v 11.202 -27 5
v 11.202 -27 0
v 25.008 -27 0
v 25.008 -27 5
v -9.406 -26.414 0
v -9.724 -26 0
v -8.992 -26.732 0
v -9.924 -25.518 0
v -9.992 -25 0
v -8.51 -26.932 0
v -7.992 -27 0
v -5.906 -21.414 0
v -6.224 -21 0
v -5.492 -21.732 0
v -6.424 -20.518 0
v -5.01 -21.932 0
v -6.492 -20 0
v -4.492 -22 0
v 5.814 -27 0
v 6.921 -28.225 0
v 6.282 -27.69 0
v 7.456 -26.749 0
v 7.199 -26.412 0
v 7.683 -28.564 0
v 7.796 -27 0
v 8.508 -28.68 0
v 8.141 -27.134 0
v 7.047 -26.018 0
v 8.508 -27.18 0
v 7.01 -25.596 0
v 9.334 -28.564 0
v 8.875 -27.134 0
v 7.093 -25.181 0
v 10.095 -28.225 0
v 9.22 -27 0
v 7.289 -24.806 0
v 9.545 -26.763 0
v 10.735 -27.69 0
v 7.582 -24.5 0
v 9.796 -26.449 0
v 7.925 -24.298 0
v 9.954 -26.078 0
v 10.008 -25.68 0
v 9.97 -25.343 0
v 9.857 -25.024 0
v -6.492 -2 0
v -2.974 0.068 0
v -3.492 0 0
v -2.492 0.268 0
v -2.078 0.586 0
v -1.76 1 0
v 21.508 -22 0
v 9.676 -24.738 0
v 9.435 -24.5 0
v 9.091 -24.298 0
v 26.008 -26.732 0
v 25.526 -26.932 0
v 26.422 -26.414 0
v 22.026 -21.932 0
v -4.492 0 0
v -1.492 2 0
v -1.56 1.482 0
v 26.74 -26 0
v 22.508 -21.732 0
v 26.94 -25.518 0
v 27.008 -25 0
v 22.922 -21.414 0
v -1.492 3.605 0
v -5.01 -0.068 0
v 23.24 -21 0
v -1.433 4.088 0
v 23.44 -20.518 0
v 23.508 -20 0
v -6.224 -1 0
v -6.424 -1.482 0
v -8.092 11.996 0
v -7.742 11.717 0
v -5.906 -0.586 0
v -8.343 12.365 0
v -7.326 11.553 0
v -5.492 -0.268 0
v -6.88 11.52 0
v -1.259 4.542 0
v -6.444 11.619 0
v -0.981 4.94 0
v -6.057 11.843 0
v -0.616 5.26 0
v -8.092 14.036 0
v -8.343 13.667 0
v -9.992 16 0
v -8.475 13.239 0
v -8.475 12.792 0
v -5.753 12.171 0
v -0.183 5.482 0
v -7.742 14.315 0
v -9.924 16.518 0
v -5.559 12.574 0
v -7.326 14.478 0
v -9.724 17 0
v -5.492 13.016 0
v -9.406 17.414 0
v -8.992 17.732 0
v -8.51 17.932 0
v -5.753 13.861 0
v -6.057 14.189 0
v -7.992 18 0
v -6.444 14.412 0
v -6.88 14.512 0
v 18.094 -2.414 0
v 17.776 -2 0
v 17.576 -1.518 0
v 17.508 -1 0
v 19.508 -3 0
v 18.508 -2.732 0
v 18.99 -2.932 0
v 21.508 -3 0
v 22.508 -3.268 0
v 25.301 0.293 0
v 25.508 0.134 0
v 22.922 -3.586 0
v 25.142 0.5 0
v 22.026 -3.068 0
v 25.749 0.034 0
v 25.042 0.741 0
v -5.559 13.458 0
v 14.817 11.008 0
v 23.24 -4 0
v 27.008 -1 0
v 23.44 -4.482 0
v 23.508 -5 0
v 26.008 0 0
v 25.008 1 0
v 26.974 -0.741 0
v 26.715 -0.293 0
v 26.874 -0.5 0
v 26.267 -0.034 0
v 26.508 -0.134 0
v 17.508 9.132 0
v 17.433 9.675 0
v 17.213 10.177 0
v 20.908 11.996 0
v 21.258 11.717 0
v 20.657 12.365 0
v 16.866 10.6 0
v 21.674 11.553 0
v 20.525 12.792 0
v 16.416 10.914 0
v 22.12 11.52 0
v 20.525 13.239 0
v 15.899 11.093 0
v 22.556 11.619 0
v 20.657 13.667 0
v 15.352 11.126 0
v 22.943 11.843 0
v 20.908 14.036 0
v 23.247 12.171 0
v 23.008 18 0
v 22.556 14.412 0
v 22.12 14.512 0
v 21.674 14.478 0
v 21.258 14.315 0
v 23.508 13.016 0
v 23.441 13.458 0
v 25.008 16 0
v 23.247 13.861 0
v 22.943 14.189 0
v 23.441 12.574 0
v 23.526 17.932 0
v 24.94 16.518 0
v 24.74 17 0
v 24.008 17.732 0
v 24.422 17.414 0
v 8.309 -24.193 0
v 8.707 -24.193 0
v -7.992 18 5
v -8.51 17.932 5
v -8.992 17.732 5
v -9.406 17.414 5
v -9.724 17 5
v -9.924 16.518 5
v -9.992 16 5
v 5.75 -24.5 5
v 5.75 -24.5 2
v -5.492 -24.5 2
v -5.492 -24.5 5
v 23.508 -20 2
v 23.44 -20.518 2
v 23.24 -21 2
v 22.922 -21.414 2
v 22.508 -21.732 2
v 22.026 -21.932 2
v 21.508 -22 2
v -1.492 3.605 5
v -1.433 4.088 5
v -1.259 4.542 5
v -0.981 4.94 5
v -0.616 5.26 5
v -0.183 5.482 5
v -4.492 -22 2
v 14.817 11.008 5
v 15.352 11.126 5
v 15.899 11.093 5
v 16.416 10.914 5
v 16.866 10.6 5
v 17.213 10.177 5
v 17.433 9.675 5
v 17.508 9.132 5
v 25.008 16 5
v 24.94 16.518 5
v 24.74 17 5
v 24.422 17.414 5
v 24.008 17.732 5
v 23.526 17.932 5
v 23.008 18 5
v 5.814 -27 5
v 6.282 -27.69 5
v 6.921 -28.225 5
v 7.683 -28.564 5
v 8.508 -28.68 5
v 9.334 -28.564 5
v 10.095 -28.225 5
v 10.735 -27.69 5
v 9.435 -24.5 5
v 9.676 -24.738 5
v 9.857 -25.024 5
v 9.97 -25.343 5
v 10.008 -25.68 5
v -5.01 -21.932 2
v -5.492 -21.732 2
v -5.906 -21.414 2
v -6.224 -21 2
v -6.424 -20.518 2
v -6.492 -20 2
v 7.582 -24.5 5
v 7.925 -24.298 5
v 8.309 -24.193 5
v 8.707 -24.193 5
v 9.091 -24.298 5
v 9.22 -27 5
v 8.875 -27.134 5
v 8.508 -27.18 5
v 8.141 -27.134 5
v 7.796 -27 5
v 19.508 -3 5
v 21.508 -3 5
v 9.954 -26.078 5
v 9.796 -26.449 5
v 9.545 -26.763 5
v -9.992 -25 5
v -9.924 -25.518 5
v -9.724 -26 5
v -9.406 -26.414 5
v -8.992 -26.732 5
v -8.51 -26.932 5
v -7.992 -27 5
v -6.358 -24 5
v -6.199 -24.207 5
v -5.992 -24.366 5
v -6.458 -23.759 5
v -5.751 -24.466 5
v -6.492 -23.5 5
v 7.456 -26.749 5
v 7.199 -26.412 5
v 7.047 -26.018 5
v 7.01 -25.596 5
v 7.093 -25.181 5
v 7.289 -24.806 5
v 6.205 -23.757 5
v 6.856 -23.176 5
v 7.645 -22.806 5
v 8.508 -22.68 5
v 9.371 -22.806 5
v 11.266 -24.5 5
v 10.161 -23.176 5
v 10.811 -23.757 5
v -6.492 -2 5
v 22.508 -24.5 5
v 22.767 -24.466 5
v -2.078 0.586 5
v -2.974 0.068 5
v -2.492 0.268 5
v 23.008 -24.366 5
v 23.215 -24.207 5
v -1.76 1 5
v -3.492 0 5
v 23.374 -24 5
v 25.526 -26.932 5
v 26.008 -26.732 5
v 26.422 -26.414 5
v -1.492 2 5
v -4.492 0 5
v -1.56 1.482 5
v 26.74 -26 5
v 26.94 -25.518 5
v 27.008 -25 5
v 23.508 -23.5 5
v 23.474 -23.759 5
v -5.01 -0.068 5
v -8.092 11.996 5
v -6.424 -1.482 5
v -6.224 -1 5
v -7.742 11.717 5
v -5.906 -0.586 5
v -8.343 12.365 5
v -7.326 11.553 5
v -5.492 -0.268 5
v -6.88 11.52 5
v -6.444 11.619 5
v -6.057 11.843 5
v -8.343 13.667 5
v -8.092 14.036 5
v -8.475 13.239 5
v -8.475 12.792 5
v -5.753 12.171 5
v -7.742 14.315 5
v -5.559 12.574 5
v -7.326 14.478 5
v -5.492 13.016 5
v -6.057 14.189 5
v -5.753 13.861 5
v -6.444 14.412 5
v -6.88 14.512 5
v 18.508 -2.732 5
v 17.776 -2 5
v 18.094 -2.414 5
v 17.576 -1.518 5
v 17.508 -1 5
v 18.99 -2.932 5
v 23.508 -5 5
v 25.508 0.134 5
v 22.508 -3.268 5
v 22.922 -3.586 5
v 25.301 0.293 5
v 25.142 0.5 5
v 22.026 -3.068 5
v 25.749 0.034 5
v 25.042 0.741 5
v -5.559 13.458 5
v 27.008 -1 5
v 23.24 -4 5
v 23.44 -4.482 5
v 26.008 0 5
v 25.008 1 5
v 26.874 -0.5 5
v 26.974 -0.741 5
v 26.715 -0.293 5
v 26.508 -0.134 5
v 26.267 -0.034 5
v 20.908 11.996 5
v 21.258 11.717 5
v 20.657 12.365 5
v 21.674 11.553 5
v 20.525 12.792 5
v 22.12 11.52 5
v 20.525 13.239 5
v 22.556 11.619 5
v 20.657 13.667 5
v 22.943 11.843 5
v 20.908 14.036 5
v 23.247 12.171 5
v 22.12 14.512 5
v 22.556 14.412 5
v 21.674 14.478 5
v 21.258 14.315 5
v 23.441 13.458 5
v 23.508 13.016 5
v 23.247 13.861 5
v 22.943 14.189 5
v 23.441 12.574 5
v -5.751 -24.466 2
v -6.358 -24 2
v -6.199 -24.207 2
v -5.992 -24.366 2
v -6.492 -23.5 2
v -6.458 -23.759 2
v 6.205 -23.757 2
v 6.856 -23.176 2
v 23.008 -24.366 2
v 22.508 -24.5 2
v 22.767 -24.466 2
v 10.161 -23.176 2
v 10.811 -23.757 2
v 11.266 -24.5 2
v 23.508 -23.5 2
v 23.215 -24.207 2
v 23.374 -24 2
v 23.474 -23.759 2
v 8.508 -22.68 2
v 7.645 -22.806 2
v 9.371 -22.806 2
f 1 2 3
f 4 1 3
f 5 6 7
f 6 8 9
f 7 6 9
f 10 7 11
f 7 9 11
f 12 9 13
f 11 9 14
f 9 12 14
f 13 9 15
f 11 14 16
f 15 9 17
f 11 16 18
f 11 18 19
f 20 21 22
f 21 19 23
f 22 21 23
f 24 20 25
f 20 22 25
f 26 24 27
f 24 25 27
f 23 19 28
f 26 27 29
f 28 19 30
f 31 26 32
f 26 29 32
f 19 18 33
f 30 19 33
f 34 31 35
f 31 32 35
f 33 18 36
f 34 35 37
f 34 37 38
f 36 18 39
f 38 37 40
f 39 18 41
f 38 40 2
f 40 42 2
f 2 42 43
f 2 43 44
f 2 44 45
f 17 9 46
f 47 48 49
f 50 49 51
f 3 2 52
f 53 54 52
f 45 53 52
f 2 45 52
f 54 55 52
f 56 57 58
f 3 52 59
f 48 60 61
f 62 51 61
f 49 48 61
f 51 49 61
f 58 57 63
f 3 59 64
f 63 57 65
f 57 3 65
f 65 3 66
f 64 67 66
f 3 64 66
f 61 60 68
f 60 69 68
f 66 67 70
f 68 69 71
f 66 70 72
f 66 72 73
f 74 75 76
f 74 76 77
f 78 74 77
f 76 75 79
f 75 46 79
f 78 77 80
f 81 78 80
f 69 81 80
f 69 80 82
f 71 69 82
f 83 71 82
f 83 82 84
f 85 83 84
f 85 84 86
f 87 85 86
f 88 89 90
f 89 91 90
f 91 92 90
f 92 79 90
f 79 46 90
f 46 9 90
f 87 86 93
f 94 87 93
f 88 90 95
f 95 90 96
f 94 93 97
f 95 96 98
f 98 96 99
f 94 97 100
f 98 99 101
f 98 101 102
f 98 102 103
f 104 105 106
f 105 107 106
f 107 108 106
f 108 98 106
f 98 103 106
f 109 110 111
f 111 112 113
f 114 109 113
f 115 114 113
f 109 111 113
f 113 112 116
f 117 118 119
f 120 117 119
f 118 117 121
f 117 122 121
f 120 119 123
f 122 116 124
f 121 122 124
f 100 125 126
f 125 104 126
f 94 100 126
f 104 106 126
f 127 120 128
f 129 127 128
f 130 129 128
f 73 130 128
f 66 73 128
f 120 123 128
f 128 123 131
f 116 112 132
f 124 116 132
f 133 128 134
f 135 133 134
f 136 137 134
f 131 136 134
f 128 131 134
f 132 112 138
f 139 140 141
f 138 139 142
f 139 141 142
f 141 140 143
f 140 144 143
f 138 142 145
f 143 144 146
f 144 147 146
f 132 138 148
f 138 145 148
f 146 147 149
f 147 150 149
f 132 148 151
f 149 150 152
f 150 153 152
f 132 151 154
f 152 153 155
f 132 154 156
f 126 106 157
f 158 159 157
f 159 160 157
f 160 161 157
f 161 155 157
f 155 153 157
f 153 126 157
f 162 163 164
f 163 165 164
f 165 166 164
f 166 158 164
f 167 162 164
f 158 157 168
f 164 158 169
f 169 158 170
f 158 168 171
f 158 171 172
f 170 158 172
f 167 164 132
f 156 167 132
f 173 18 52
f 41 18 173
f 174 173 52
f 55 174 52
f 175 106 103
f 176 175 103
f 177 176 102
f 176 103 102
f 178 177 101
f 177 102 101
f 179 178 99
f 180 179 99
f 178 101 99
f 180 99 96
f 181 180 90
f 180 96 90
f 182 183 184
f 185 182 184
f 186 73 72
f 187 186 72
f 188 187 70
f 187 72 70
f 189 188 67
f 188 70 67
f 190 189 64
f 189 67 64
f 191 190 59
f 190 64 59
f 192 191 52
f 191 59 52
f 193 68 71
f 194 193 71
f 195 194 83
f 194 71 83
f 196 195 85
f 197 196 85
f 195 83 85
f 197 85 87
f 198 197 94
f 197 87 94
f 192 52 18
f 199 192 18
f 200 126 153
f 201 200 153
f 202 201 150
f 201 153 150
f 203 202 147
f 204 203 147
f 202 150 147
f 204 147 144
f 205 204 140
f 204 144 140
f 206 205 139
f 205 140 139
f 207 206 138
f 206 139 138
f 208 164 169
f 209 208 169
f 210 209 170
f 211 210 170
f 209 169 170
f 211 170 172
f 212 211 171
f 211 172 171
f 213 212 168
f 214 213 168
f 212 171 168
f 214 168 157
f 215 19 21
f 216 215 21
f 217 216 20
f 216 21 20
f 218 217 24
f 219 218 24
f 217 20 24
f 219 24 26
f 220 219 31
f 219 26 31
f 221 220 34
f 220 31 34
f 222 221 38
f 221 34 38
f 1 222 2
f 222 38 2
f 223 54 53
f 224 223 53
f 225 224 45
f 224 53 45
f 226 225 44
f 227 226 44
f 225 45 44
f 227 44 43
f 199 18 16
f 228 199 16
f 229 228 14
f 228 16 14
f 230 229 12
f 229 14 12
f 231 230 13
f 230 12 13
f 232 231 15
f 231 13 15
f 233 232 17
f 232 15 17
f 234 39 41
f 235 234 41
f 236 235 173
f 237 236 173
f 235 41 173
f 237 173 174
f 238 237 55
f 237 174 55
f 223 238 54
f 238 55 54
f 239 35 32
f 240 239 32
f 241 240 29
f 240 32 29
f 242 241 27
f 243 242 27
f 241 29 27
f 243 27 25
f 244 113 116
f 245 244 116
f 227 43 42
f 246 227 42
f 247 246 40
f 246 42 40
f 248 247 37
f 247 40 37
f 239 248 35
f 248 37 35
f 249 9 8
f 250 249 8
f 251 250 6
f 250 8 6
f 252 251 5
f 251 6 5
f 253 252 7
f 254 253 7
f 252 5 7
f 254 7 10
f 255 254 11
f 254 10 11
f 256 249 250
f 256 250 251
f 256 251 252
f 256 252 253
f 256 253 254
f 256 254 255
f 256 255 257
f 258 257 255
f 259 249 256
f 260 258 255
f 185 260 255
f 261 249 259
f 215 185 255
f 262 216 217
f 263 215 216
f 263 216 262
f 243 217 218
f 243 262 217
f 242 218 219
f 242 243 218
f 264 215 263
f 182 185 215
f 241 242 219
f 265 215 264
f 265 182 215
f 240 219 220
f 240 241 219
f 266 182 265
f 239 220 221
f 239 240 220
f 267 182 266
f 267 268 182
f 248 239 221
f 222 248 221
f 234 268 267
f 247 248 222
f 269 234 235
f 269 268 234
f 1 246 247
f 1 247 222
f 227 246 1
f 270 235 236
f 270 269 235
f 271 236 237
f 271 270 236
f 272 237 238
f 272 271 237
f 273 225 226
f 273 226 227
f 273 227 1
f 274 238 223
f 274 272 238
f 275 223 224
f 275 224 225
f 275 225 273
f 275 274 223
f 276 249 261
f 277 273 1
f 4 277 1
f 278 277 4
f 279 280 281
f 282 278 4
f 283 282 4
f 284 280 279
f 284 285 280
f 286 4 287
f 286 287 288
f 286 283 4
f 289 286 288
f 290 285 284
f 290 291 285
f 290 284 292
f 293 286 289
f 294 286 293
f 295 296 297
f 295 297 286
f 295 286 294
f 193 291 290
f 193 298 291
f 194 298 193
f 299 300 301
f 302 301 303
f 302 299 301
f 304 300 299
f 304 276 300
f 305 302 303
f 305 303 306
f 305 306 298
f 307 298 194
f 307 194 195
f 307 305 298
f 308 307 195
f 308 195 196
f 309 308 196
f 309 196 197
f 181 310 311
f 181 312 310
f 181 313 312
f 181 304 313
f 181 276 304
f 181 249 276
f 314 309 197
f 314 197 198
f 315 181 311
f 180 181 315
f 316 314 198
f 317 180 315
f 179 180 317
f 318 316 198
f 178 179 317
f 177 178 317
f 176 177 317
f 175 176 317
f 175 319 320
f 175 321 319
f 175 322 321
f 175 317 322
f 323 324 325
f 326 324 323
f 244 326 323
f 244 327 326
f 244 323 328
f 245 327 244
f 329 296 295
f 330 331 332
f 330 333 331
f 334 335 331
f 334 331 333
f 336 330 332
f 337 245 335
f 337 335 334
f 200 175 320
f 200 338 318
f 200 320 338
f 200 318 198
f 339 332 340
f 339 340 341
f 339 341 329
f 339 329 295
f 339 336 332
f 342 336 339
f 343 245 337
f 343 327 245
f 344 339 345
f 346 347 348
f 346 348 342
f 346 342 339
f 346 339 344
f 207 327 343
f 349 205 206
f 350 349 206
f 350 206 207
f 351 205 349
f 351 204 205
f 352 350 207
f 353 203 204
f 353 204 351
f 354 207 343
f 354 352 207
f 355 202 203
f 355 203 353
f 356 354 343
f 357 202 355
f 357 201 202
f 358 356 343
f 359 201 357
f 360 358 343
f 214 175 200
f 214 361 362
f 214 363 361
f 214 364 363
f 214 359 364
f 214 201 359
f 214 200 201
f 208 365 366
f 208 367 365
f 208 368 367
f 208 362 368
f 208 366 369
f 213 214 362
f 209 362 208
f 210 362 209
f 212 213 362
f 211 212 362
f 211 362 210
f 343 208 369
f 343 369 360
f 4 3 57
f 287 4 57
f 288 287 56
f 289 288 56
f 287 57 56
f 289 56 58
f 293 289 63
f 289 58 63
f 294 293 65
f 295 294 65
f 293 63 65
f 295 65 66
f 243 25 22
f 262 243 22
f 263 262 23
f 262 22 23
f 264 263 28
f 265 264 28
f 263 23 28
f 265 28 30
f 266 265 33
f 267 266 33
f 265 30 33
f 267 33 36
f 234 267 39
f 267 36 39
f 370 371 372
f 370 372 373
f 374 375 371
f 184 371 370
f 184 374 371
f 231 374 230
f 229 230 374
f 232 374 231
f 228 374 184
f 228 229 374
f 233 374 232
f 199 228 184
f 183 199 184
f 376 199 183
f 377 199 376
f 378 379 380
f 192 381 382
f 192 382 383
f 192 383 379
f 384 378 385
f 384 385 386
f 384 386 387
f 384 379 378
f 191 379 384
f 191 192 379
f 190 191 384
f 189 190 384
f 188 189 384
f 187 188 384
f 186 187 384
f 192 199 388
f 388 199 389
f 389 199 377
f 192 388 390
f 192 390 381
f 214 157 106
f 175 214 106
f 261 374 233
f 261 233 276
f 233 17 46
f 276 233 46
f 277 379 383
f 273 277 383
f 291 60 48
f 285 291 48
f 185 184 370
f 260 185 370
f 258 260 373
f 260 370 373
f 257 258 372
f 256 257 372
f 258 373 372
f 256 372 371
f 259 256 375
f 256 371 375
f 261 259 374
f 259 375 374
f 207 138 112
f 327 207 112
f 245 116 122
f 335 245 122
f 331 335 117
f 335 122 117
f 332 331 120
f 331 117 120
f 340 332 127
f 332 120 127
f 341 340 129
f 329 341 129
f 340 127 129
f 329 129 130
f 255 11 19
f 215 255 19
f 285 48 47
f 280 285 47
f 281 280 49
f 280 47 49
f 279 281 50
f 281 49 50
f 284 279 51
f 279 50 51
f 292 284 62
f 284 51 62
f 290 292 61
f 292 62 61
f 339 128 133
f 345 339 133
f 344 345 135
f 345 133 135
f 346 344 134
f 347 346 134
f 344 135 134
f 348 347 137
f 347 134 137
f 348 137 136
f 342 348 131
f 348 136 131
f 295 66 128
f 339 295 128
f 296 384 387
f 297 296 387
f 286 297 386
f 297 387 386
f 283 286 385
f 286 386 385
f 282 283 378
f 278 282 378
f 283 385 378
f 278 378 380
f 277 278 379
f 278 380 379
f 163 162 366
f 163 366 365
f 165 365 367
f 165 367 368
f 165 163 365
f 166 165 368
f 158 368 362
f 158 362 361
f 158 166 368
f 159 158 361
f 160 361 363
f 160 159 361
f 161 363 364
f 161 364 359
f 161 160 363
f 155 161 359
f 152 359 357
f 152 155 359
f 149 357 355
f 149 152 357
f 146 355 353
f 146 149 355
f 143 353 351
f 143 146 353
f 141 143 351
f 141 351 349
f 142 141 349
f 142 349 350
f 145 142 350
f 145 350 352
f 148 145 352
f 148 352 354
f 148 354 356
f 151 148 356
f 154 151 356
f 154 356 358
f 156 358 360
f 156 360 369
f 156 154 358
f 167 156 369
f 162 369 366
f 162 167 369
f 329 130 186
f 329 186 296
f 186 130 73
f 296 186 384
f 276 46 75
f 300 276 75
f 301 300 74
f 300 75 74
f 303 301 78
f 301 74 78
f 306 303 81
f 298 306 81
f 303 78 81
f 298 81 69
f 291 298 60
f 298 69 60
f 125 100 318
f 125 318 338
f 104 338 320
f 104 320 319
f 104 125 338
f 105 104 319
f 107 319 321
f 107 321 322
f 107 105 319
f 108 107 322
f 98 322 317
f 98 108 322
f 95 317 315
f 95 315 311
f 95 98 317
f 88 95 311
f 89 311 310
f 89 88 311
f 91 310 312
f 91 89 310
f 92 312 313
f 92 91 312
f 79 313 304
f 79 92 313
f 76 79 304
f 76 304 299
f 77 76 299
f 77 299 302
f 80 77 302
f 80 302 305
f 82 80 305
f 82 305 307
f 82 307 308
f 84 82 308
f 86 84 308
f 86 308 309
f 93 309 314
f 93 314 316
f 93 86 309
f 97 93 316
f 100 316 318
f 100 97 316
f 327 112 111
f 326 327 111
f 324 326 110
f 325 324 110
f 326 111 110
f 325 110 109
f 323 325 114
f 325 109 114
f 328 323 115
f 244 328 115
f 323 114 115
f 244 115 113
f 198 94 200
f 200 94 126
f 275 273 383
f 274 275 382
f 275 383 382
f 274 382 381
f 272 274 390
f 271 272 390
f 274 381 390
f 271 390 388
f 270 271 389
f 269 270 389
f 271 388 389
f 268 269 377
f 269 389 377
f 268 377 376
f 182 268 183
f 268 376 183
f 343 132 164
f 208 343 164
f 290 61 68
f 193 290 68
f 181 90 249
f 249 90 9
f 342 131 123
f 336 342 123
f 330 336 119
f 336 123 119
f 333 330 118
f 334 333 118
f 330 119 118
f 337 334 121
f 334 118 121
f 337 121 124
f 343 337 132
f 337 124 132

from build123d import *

# Parameters (mm, degrees)
F1_DEPTH = 2
F0_R     = 3
F0_R_2   = 1.5
F2_DEPTH = 5
F3_DEPTH = 5


with BuildPart() as f1:
    # F0 (on Top) → F1 (new body)
    with BuildSketch(Plane.XY):
        with BuildLine():
            Line((-5.4919344625, -24.5), (5.7497143832, -24.5))
            ThreePointArc((5.7497143832, -24.5), (8.5080655375, -22.6796181202), (11.2664166918, -24.5))
            Line((11.2664166918, -24.5), (22.5080655375, -24.5))
            ThreePointArc((22.5080655375, -24.5), (23.2151723187, -24.2071067812), (23.5080655375, -23.5))
            Line((23.5080655375, -23.5), (23.5080655375, -20))
            ThreePointArc((23.5080655375, -20), (22.9222790999, -21.4142135624), (21.5080655375, -22))
            Line((21.5080655375, -22), (-4.4919344625, -22))
            ThreePointArc((-4.4919344625, -22), (-5.9061480249, -21.4142135624), (-6.4919344625, -20))
            Line((-6.4919344625, -20), (-6.4919344625, -23.5))
            ThreePointArc((-6.4919344625, -23.5), (-6.1990412437, -24.2071067812), (-5.4919344625, -24.5))
        make_face()
    extrude(amount=F1_DEPTH)

    # F0 (on Top) → F2 (join)
    with BuildSketch(Plane.XY):
        with BuildLine():
            Line((23.0080655375, 18), (-7.9919344625, 18))
            ThreePointArc((-7.9919344625, 18), (-9.4061480249, 17.4142135624), (-9.9919344625, 16))
            Line((-9.9919344625, 16), (-9.9919344625, 13.0157731473))
            Line((-9.9919344625, 13.0157731473), (-9.9919344625, -25))
            ThreePointArc((-9.9919344625, -25), (-9.4061480249, -26.4142135624), (-7.9919344625, -27))
            Line((-7.9919344625, -27), (5.8142593657, -27))
            ThreePointArc((5.8142593657, -27), (5.5090648911, -25.7570462979), (5.7497143832, -24.5))
            Line((5.7497143832, -24.5), (-5.4919344625, -24.5))
            ThreePointArc((-5.4919344625, -24.5), (-6.1990412437, -24.2071067812), (-6.4919344625, -23.5))
            Line((-6.4919344625, -23.5), (-6.4919344625, -20))
            Line((-6.4919344625, -20), (-6.4919344625, -2))
            ThreePointArc((-6.4919344625, -2), (-5.9061480249, -0.5857864376), (-4.4919344625, 0))
            Line((-4.4919344625, 0), (-3.4919344625, 0))
            ThreePointArc((-3.4919344625, 0), (-2.0777209001, 0.5857864376), (-1.4919344625, 2))
            Line((-1.4919344625, 2), (-1.4919344625, 3.6054256072))
            ThreePointArc((-1.4919344625, 3.6054256072), (-1.1324864177, 4.7493614806), (-0.1833451802, 5.4821118409))
            Line((-0.1833451802, 5.4821118409), (14.8166548198, 11.0084276303))
            ThreePointArc((14.8166548198, 11.0084276303), (16.6520014109, 10.7722933519), (17.5080655375, 9.1317413967))
            Line((17.5080655375, 9.1317413967), (17.5080655375, -1))
            ThreePointArc((17.5080655375, -1), (18.0938519751, -2.4142135624), (19.5080655375, -3))
            Line((19.5080655375, -3), (21.5080655375, -3))
            ThreePointArc((21.5080655375, -3), (22.9222790999, -3.5857864376), (23.5080655375, -5))
            Line((23.5080655375, -5), (23.5080655375, -20))
            Line((23.5080655375, -20), (23.5080655375, -23.5))
            ThreePointArc((23.5080655375, -23.5), (23.2151723187, -24.2071067812), (22.5080655375, -24.5))
            Line((22.5080655375, -24.5), (11.2664166918, -24.5))
            ThreePointArc((11.2664166918, -24.5), (11.4470324872, -25.0775605909), (11.5080655375, -25.6796181202))
            ThreePointArc((11.5080655375, -25.6796181202), (11.4305147257, -26.357328045), (11.2018717093, -27))
            Line((11.2018717093, -27), (25.0080655375, -27))
            ThreePointArc((25.0080655375, -27), (26.4222790999, -26.4142135624), (27.0080655375, -25))
            Line((27.0080655375, -25), (27.0080655375, -1))
            ThreePointArc((27.0080655375, -1), (26.7151723187, -0.2928932188), (26.0080655375, 0))
            ThreePointArc((26.0080655375, 0), (25.3009587563, 0.2928932188), (25.0080655375, 1))
            Line((25.0080655375, 1), (25.0080655375, 13.0157731473))
            Line((25.0080655375, 13.0157731473), (25.0080655375, 16))
            ThreePointArc((25.0080655375, 16), (24.4222790999, 17.4142135624), (23.0080655375, 18))
        make_face()
        with BuildLine():
            ThreePointArc((-3.9919344625, 13.0157731473), (-6.9919344625, 10.0157731473), (-9.9919344625, 13.0157731473))
            ThreePointArc((-9.9919344625, 13.0157731473), (-6.9919344625, 16.0157731473), (-3.9919344625, 13.0157731473))
        make_face(mode=Mode.SUBTRACT)
        with Locations((22.0080655375, 13.0157731473)):
            Circle(F0_R, mode=Mode.SUBTRACT)
        with BuildLine():
            ThreePointArc((-3.9919344625, 13.0157731473), (-6.9919344625, 16.0157731473), (-9.9919344625, 13.0157731473))
            ThreePointArc((-9.9919344625, 13.0157731473), (-6.9919344625, 10.0157731473), (-3.9919344625, 13.0157731473))
        make_face()
        with Locations((-6.9919344625, 13.0157731473)):
            Circle(F0_R_2, mode=Mode.SUBTRACT)
        with Locations((22.0080655375, 13.0157731473)):
            Circle(F0_R)
        with Locations((22.0080655375, 13.0157731473)):
            Circle(F0_R_2, mode=Mode.SUBTRACT)
        with BuildLine():
            Line((7.7963129882, -27), (5.8142593657, -27))
            ThreePointArc((5.8142593657, -27), (8.5080655375, -28.6796181202), (11.2018717093, -27))
            Line((11.2018717093, -27), (9.2198180868, -27))
            ThreePointArc((9.2198180868, -27), (8.5080655375, -27.1796181202), (7.7963129882, -27))
        make_face()
        with BuildLine():
            ThreePointArc((5.7497143832, -24.5), (5.5090648911, -25.7570462979), (5.8142593657, -27))
            Line((5.8142593657, -27), (7.7963129882, -27))
            ThreePointArc((7.7963129882, -27), (7.0135717951, -25.8080254948), (7.5815121982, -24.5))
            Line((7.5815121982, -24.5), (5.7497143832, -24.5))
        make_face()
        with BuildLine():
            Line((9.2198180868, -27), (11.2018717093, -27))
            ThreePointArc((11.2018717093, -27), (11.4305147257, -26.357328045), (11.5080655375, -25.6796181202))
            ThreePointArc((11.5080655375, -25.6796181202), (11.4470324872, -25.0775605909), (11.2664166918, -24.5))
            Line((11.2664166918, -24.5), (9.4346188768, -24.5))
            ThreePointArc((9.4346188768, -24.5), (9.857107792, -25.0238094625), (10.0080655375, -25.6796181202))
            ThreePointArc((10.0080655375, -25.6796181202), (9.7960152306, -26.4485040597), (9.2198180868, -27))
        make_face()
    extrude(amount=F2_DEPTH)

    # F0 (on Top) → F3 (join)
    with BuildSketch(Plane.XY):
        with BuildLine():
            ThreePointArc((11.2664166918, -24.5), (8.5080655375, -22.6796181202), (5.7497143832, -24.5))
            Line((5.7497143832, -24.5), (7.5815121982, -24.5))
            ThreePointArc((7.5815121982, -24.5), (8.5080655375, -24.1796181202), (9.4346188768, -24.5))
            Line((9.4346188768, -24.5), (11.2664166918, -24.5))
        make_face()
    extrude(amount=F3_DEPTH)


solid = f1.part
